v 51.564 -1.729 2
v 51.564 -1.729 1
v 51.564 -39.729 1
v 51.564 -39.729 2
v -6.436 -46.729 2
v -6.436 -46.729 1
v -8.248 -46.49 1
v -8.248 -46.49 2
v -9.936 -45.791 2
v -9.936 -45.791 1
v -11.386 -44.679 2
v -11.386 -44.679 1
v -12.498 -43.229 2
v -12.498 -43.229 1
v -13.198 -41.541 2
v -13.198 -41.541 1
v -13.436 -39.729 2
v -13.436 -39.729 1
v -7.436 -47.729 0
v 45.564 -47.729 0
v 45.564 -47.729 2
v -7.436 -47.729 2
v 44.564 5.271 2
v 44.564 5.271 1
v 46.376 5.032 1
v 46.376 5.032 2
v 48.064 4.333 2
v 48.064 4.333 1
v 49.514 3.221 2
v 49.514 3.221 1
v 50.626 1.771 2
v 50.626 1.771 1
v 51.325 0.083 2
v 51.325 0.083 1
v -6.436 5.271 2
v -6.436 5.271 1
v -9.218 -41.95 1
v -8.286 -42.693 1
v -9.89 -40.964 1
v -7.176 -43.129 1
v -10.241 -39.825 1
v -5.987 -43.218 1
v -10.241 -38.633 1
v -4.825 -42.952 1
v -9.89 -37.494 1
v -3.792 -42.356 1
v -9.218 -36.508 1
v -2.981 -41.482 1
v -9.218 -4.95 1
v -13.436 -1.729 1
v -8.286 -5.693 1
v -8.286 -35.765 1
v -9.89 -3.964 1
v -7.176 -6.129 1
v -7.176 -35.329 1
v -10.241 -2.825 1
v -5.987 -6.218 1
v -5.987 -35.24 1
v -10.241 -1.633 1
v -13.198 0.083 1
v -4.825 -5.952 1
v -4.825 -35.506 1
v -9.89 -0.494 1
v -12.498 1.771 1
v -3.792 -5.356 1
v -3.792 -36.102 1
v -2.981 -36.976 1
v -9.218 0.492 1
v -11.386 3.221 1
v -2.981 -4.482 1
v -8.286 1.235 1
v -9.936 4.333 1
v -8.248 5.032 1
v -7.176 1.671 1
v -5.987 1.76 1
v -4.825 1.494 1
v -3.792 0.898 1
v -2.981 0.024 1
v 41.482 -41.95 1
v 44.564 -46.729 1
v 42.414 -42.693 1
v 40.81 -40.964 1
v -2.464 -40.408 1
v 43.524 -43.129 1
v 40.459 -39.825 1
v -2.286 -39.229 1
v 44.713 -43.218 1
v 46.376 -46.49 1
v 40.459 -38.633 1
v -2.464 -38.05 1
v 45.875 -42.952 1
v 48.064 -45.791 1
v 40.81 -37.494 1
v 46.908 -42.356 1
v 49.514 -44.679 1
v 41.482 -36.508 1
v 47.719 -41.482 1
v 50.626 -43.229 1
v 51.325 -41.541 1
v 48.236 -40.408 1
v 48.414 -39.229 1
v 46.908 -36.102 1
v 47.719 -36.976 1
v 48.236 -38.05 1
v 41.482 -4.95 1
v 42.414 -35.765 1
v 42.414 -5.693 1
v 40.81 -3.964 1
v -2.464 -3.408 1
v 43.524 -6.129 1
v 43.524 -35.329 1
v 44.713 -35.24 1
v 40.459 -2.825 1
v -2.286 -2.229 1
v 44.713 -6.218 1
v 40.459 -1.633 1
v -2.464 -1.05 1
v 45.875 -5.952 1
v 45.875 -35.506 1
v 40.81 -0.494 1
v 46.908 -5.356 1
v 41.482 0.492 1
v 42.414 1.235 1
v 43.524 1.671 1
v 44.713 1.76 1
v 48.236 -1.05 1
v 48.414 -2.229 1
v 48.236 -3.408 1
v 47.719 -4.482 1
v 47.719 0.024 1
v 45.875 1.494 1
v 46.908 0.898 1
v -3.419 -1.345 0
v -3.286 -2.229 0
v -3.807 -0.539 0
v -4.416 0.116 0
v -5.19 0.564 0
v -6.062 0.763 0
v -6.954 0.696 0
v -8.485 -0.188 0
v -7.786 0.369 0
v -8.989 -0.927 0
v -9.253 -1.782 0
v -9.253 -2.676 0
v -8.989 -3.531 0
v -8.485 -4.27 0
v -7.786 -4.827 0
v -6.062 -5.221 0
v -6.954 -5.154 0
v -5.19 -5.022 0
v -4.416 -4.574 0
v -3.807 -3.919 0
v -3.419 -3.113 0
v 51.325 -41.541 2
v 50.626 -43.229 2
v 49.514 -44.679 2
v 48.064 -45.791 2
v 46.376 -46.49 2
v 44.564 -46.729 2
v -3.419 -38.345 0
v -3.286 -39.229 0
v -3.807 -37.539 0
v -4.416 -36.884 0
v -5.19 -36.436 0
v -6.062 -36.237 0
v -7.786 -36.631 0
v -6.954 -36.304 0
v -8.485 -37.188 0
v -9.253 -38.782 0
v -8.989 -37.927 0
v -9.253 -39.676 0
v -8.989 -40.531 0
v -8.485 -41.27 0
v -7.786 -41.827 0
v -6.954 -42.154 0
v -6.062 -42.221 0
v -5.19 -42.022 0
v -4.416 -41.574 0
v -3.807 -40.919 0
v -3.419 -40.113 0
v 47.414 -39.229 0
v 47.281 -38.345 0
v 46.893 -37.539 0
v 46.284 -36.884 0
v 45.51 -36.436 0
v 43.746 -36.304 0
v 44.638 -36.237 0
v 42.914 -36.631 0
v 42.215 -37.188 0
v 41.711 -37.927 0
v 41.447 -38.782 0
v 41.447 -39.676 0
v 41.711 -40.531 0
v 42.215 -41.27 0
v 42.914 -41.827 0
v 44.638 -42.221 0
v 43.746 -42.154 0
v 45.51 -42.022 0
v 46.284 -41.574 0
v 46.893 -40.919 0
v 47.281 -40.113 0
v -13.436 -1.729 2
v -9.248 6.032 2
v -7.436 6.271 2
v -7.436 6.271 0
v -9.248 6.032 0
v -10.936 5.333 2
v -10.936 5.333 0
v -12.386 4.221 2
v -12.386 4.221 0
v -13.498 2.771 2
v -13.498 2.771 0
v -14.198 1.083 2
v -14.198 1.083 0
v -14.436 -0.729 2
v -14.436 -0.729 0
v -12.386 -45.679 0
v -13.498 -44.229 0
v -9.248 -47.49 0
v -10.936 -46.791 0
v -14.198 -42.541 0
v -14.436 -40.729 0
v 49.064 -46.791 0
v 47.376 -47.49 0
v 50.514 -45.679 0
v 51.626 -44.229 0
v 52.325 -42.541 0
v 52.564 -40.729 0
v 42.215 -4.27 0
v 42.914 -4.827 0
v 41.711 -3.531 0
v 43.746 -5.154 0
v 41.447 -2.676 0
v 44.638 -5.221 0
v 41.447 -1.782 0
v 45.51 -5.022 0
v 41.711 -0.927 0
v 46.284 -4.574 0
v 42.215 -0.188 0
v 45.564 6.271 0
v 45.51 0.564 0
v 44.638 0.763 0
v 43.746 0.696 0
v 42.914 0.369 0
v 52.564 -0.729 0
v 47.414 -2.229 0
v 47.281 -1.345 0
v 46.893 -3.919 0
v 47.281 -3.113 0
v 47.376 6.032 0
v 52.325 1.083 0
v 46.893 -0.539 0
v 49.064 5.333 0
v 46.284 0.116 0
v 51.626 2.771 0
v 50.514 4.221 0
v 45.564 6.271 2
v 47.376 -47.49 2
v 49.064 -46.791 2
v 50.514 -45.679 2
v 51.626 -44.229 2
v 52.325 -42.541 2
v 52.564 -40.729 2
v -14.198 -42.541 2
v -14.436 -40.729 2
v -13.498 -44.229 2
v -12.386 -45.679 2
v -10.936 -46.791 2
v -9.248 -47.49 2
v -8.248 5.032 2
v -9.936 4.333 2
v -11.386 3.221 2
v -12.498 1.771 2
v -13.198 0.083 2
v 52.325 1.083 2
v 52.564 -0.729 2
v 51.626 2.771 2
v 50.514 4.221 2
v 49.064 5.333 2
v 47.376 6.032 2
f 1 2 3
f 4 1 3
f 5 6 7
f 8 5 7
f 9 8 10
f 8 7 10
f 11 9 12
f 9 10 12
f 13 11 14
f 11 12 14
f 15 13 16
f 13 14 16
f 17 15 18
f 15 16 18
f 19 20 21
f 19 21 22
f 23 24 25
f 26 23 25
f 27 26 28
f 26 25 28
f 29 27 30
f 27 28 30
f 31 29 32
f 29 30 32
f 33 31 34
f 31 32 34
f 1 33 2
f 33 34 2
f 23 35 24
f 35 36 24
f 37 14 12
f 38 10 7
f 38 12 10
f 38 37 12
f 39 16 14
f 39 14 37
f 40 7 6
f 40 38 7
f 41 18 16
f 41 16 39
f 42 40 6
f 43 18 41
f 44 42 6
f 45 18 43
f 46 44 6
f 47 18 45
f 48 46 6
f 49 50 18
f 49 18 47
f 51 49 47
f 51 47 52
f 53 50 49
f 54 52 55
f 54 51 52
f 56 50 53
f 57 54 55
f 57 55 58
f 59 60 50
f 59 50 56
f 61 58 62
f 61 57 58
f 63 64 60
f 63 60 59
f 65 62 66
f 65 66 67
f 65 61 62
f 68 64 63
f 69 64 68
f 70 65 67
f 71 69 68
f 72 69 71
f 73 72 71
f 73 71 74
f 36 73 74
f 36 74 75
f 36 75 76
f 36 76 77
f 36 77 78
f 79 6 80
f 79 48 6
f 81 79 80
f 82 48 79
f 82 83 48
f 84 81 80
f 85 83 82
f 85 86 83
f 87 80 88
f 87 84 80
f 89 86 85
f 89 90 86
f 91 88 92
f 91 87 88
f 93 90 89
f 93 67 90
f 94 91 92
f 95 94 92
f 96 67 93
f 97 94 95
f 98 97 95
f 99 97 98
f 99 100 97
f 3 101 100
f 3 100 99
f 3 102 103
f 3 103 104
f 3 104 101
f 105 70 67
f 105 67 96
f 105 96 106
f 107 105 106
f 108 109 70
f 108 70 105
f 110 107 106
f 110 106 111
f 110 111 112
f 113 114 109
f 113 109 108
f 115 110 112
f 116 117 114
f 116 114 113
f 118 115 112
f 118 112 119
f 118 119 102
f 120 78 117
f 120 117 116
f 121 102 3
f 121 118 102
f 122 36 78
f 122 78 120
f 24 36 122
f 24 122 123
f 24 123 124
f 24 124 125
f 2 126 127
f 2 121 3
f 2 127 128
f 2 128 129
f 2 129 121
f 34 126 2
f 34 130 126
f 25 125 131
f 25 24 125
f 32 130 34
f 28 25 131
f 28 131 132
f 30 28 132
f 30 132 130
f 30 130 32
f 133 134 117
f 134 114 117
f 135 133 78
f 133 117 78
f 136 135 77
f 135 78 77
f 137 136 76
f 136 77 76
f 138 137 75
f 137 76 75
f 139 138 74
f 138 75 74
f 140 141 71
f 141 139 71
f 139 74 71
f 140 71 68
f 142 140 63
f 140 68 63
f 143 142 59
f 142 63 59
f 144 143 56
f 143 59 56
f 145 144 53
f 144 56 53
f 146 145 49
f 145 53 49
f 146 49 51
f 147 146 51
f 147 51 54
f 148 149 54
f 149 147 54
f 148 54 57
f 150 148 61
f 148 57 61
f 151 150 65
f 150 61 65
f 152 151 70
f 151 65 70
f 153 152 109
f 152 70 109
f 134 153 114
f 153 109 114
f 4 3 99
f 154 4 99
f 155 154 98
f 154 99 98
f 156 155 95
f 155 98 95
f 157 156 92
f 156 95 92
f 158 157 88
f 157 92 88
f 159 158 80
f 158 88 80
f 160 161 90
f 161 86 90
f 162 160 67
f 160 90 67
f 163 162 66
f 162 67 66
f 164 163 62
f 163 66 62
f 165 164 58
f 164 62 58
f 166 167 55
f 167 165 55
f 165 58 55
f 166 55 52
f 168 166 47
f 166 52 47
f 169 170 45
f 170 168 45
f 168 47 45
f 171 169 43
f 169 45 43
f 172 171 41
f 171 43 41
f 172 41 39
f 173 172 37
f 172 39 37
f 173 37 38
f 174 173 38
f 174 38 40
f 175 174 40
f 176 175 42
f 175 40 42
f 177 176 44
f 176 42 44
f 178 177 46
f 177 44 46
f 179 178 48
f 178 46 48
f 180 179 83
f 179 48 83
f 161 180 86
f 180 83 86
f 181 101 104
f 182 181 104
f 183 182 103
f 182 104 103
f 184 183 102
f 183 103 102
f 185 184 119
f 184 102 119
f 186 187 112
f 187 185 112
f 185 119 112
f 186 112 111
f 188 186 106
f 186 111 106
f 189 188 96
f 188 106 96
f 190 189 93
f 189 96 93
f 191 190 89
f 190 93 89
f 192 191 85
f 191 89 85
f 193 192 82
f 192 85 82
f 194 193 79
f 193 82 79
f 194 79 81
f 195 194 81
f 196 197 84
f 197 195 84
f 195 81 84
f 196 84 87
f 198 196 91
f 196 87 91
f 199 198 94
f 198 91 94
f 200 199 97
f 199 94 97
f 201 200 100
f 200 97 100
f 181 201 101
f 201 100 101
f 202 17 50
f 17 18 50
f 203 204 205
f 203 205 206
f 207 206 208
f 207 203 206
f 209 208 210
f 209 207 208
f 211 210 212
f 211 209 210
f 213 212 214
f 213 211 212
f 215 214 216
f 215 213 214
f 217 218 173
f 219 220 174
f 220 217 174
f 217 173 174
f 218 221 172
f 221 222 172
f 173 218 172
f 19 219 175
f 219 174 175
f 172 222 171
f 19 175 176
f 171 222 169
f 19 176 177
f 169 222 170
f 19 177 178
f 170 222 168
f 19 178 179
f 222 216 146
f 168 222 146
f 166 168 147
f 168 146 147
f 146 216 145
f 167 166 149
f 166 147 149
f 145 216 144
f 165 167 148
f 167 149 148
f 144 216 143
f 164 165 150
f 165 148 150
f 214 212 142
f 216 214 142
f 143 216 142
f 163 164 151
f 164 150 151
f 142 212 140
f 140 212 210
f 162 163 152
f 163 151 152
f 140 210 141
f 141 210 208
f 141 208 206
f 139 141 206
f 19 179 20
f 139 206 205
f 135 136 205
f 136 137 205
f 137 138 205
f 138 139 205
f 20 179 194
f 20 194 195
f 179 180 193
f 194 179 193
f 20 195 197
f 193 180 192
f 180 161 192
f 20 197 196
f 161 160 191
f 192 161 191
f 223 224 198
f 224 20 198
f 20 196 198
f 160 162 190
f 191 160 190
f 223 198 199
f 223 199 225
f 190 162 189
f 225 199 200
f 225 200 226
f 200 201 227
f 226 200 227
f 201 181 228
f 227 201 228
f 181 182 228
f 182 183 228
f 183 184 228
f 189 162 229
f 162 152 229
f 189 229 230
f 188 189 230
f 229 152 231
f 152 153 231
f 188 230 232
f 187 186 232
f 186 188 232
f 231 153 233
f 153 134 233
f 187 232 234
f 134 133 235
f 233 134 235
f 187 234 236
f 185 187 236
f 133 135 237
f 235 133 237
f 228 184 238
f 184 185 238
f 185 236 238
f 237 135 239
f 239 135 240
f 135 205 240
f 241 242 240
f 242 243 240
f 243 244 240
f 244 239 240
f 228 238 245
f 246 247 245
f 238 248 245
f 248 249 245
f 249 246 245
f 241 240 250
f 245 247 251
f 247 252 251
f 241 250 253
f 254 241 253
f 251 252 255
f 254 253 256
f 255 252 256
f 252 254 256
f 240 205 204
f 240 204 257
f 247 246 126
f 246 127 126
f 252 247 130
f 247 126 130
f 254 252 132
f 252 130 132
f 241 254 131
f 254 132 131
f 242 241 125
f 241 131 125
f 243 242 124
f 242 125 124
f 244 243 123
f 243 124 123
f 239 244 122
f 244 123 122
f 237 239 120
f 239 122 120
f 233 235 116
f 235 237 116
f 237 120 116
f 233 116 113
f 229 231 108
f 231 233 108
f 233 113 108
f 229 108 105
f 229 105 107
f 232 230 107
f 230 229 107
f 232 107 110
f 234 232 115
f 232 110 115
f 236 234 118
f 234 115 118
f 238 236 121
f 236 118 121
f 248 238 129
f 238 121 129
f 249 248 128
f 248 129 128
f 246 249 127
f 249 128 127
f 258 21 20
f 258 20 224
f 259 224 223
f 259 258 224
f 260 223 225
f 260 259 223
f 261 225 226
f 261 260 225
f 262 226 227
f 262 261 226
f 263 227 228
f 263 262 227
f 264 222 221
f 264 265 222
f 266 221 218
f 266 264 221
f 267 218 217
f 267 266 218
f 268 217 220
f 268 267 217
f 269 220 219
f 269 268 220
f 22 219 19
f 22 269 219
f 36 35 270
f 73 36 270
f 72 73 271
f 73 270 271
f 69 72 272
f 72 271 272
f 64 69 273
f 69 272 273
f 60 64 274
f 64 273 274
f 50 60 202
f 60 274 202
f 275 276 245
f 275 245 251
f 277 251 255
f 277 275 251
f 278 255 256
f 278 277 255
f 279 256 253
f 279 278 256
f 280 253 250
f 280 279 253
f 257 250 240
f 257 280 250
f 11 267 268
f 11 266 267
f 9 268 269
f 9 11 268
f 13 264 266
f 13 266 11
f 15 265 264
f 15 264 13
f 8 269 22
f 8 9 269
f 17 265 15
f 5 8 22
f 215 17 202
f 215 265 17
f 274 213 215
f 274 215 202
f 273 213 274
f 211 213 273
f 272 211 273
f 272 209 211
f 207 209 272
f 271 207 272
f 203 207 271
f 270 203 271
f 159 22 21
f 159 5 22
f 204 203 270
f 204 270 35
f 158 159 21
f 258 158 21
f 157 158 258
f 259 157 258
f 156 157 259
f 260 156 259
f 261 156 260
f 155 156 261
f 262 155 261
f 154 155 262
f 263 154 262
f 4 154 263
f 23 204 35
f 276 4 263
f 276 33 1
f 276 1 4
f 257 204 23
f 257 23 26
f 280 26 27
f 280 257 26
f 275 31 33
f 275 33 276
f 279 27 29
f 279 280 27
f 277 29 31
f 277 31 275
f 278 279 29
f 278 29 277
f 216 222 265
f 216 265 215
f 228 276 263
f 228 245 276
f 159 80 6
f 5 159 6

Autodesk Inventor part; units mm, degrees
ref_plane "YZ Plane" through (0, 0, 0) normal (1, 0, 0) x (0, 1, 0)
ref_plane "XZ Plane" through (0, 0, 0) normal (0, 1, 0) x (-1, 0, 0)
ref_plane "XY Plane" through (0, 0, 0) normal (0, 0, 1) x (1, 0, 0)
sketch "Esboço1" plane through (0, 0, 0) normal (0, 0, 1) x (1, 0, 0)
  line L0 (-14.4362, 6.271) -> (52.5638, 6.271)
  line L1 (52.5638, 6.271) -> (52.5638, -47.729)
  line L2 (52.5638, -47.729) -> (-14.4362, -47.729)
  line L3 (-14.4362, -47.729) -> (-14.4362, 6.271)
  circle A0 centre (-6.2862, -2.229) radius 3
  circle A1 centre (-6.2862, -39.229) radius 3
  circle A2 centre (44.4138, -39.229) radius 3
  circle A3 centre (44.4138, -2.229) radius 3
  point P0 (0, 0)
  dimension "d0" = 67
  dimension "d1" = 54
  dimension "d6" = 6
  dimension "d7" = 6
  dimension "d8" = 6
  dimension "d9" = 6
  dimension "d17" = 50.7
  dimension "d18" = 50.7
  dimension "d19" = 37
  dimension "d20" = 37
  dimension "d21" = 8.15
  dimension "d22" = 8.5
  dimension "d24" = 8.15
  dimension "d26" = 8.5
  dimension "d27" = 8.15
  dimension "d28" = 8.15
  dimension "d29" = 8.5
  dimension "d30" = 8.5
extrude "Extrusão1" add sketch "Esboço1" along normal blind 2
shell "Casca1" thickness 1 removed faces 5 at (11.3623, -15.2254, 2) at (-3.2959, -39.4704, 1.3333) at (-3.2959, -2.4704, 1.3333) at (47.4041, -2.4704, 1.3333) at (47.4041, -39.4704, 1.3333)
chamfer "Chanfro1" distance 1 angle 45 4 edges at (-9.2862, -39.229, 1) (-9.2862, -2.229, 1) (41.4138, -2.229, 1) (41.4138, -39.229, 1)
fillet "Arredondamento1" radius 7 8 edges at (-13.4362, 5.271, 1.5) (-14.4362, 6.271, 1) (52.5638, 6.271, 1) (51.5638, 5.271, 1.5) (51.5638, -46.729, 1.5) (52.5638, -47.729, 1) (-13.4362, -46.729, 1.5) (-14.4362, -47.729, 1)
properties part number "capa de alguma parte da guitarra 2"
